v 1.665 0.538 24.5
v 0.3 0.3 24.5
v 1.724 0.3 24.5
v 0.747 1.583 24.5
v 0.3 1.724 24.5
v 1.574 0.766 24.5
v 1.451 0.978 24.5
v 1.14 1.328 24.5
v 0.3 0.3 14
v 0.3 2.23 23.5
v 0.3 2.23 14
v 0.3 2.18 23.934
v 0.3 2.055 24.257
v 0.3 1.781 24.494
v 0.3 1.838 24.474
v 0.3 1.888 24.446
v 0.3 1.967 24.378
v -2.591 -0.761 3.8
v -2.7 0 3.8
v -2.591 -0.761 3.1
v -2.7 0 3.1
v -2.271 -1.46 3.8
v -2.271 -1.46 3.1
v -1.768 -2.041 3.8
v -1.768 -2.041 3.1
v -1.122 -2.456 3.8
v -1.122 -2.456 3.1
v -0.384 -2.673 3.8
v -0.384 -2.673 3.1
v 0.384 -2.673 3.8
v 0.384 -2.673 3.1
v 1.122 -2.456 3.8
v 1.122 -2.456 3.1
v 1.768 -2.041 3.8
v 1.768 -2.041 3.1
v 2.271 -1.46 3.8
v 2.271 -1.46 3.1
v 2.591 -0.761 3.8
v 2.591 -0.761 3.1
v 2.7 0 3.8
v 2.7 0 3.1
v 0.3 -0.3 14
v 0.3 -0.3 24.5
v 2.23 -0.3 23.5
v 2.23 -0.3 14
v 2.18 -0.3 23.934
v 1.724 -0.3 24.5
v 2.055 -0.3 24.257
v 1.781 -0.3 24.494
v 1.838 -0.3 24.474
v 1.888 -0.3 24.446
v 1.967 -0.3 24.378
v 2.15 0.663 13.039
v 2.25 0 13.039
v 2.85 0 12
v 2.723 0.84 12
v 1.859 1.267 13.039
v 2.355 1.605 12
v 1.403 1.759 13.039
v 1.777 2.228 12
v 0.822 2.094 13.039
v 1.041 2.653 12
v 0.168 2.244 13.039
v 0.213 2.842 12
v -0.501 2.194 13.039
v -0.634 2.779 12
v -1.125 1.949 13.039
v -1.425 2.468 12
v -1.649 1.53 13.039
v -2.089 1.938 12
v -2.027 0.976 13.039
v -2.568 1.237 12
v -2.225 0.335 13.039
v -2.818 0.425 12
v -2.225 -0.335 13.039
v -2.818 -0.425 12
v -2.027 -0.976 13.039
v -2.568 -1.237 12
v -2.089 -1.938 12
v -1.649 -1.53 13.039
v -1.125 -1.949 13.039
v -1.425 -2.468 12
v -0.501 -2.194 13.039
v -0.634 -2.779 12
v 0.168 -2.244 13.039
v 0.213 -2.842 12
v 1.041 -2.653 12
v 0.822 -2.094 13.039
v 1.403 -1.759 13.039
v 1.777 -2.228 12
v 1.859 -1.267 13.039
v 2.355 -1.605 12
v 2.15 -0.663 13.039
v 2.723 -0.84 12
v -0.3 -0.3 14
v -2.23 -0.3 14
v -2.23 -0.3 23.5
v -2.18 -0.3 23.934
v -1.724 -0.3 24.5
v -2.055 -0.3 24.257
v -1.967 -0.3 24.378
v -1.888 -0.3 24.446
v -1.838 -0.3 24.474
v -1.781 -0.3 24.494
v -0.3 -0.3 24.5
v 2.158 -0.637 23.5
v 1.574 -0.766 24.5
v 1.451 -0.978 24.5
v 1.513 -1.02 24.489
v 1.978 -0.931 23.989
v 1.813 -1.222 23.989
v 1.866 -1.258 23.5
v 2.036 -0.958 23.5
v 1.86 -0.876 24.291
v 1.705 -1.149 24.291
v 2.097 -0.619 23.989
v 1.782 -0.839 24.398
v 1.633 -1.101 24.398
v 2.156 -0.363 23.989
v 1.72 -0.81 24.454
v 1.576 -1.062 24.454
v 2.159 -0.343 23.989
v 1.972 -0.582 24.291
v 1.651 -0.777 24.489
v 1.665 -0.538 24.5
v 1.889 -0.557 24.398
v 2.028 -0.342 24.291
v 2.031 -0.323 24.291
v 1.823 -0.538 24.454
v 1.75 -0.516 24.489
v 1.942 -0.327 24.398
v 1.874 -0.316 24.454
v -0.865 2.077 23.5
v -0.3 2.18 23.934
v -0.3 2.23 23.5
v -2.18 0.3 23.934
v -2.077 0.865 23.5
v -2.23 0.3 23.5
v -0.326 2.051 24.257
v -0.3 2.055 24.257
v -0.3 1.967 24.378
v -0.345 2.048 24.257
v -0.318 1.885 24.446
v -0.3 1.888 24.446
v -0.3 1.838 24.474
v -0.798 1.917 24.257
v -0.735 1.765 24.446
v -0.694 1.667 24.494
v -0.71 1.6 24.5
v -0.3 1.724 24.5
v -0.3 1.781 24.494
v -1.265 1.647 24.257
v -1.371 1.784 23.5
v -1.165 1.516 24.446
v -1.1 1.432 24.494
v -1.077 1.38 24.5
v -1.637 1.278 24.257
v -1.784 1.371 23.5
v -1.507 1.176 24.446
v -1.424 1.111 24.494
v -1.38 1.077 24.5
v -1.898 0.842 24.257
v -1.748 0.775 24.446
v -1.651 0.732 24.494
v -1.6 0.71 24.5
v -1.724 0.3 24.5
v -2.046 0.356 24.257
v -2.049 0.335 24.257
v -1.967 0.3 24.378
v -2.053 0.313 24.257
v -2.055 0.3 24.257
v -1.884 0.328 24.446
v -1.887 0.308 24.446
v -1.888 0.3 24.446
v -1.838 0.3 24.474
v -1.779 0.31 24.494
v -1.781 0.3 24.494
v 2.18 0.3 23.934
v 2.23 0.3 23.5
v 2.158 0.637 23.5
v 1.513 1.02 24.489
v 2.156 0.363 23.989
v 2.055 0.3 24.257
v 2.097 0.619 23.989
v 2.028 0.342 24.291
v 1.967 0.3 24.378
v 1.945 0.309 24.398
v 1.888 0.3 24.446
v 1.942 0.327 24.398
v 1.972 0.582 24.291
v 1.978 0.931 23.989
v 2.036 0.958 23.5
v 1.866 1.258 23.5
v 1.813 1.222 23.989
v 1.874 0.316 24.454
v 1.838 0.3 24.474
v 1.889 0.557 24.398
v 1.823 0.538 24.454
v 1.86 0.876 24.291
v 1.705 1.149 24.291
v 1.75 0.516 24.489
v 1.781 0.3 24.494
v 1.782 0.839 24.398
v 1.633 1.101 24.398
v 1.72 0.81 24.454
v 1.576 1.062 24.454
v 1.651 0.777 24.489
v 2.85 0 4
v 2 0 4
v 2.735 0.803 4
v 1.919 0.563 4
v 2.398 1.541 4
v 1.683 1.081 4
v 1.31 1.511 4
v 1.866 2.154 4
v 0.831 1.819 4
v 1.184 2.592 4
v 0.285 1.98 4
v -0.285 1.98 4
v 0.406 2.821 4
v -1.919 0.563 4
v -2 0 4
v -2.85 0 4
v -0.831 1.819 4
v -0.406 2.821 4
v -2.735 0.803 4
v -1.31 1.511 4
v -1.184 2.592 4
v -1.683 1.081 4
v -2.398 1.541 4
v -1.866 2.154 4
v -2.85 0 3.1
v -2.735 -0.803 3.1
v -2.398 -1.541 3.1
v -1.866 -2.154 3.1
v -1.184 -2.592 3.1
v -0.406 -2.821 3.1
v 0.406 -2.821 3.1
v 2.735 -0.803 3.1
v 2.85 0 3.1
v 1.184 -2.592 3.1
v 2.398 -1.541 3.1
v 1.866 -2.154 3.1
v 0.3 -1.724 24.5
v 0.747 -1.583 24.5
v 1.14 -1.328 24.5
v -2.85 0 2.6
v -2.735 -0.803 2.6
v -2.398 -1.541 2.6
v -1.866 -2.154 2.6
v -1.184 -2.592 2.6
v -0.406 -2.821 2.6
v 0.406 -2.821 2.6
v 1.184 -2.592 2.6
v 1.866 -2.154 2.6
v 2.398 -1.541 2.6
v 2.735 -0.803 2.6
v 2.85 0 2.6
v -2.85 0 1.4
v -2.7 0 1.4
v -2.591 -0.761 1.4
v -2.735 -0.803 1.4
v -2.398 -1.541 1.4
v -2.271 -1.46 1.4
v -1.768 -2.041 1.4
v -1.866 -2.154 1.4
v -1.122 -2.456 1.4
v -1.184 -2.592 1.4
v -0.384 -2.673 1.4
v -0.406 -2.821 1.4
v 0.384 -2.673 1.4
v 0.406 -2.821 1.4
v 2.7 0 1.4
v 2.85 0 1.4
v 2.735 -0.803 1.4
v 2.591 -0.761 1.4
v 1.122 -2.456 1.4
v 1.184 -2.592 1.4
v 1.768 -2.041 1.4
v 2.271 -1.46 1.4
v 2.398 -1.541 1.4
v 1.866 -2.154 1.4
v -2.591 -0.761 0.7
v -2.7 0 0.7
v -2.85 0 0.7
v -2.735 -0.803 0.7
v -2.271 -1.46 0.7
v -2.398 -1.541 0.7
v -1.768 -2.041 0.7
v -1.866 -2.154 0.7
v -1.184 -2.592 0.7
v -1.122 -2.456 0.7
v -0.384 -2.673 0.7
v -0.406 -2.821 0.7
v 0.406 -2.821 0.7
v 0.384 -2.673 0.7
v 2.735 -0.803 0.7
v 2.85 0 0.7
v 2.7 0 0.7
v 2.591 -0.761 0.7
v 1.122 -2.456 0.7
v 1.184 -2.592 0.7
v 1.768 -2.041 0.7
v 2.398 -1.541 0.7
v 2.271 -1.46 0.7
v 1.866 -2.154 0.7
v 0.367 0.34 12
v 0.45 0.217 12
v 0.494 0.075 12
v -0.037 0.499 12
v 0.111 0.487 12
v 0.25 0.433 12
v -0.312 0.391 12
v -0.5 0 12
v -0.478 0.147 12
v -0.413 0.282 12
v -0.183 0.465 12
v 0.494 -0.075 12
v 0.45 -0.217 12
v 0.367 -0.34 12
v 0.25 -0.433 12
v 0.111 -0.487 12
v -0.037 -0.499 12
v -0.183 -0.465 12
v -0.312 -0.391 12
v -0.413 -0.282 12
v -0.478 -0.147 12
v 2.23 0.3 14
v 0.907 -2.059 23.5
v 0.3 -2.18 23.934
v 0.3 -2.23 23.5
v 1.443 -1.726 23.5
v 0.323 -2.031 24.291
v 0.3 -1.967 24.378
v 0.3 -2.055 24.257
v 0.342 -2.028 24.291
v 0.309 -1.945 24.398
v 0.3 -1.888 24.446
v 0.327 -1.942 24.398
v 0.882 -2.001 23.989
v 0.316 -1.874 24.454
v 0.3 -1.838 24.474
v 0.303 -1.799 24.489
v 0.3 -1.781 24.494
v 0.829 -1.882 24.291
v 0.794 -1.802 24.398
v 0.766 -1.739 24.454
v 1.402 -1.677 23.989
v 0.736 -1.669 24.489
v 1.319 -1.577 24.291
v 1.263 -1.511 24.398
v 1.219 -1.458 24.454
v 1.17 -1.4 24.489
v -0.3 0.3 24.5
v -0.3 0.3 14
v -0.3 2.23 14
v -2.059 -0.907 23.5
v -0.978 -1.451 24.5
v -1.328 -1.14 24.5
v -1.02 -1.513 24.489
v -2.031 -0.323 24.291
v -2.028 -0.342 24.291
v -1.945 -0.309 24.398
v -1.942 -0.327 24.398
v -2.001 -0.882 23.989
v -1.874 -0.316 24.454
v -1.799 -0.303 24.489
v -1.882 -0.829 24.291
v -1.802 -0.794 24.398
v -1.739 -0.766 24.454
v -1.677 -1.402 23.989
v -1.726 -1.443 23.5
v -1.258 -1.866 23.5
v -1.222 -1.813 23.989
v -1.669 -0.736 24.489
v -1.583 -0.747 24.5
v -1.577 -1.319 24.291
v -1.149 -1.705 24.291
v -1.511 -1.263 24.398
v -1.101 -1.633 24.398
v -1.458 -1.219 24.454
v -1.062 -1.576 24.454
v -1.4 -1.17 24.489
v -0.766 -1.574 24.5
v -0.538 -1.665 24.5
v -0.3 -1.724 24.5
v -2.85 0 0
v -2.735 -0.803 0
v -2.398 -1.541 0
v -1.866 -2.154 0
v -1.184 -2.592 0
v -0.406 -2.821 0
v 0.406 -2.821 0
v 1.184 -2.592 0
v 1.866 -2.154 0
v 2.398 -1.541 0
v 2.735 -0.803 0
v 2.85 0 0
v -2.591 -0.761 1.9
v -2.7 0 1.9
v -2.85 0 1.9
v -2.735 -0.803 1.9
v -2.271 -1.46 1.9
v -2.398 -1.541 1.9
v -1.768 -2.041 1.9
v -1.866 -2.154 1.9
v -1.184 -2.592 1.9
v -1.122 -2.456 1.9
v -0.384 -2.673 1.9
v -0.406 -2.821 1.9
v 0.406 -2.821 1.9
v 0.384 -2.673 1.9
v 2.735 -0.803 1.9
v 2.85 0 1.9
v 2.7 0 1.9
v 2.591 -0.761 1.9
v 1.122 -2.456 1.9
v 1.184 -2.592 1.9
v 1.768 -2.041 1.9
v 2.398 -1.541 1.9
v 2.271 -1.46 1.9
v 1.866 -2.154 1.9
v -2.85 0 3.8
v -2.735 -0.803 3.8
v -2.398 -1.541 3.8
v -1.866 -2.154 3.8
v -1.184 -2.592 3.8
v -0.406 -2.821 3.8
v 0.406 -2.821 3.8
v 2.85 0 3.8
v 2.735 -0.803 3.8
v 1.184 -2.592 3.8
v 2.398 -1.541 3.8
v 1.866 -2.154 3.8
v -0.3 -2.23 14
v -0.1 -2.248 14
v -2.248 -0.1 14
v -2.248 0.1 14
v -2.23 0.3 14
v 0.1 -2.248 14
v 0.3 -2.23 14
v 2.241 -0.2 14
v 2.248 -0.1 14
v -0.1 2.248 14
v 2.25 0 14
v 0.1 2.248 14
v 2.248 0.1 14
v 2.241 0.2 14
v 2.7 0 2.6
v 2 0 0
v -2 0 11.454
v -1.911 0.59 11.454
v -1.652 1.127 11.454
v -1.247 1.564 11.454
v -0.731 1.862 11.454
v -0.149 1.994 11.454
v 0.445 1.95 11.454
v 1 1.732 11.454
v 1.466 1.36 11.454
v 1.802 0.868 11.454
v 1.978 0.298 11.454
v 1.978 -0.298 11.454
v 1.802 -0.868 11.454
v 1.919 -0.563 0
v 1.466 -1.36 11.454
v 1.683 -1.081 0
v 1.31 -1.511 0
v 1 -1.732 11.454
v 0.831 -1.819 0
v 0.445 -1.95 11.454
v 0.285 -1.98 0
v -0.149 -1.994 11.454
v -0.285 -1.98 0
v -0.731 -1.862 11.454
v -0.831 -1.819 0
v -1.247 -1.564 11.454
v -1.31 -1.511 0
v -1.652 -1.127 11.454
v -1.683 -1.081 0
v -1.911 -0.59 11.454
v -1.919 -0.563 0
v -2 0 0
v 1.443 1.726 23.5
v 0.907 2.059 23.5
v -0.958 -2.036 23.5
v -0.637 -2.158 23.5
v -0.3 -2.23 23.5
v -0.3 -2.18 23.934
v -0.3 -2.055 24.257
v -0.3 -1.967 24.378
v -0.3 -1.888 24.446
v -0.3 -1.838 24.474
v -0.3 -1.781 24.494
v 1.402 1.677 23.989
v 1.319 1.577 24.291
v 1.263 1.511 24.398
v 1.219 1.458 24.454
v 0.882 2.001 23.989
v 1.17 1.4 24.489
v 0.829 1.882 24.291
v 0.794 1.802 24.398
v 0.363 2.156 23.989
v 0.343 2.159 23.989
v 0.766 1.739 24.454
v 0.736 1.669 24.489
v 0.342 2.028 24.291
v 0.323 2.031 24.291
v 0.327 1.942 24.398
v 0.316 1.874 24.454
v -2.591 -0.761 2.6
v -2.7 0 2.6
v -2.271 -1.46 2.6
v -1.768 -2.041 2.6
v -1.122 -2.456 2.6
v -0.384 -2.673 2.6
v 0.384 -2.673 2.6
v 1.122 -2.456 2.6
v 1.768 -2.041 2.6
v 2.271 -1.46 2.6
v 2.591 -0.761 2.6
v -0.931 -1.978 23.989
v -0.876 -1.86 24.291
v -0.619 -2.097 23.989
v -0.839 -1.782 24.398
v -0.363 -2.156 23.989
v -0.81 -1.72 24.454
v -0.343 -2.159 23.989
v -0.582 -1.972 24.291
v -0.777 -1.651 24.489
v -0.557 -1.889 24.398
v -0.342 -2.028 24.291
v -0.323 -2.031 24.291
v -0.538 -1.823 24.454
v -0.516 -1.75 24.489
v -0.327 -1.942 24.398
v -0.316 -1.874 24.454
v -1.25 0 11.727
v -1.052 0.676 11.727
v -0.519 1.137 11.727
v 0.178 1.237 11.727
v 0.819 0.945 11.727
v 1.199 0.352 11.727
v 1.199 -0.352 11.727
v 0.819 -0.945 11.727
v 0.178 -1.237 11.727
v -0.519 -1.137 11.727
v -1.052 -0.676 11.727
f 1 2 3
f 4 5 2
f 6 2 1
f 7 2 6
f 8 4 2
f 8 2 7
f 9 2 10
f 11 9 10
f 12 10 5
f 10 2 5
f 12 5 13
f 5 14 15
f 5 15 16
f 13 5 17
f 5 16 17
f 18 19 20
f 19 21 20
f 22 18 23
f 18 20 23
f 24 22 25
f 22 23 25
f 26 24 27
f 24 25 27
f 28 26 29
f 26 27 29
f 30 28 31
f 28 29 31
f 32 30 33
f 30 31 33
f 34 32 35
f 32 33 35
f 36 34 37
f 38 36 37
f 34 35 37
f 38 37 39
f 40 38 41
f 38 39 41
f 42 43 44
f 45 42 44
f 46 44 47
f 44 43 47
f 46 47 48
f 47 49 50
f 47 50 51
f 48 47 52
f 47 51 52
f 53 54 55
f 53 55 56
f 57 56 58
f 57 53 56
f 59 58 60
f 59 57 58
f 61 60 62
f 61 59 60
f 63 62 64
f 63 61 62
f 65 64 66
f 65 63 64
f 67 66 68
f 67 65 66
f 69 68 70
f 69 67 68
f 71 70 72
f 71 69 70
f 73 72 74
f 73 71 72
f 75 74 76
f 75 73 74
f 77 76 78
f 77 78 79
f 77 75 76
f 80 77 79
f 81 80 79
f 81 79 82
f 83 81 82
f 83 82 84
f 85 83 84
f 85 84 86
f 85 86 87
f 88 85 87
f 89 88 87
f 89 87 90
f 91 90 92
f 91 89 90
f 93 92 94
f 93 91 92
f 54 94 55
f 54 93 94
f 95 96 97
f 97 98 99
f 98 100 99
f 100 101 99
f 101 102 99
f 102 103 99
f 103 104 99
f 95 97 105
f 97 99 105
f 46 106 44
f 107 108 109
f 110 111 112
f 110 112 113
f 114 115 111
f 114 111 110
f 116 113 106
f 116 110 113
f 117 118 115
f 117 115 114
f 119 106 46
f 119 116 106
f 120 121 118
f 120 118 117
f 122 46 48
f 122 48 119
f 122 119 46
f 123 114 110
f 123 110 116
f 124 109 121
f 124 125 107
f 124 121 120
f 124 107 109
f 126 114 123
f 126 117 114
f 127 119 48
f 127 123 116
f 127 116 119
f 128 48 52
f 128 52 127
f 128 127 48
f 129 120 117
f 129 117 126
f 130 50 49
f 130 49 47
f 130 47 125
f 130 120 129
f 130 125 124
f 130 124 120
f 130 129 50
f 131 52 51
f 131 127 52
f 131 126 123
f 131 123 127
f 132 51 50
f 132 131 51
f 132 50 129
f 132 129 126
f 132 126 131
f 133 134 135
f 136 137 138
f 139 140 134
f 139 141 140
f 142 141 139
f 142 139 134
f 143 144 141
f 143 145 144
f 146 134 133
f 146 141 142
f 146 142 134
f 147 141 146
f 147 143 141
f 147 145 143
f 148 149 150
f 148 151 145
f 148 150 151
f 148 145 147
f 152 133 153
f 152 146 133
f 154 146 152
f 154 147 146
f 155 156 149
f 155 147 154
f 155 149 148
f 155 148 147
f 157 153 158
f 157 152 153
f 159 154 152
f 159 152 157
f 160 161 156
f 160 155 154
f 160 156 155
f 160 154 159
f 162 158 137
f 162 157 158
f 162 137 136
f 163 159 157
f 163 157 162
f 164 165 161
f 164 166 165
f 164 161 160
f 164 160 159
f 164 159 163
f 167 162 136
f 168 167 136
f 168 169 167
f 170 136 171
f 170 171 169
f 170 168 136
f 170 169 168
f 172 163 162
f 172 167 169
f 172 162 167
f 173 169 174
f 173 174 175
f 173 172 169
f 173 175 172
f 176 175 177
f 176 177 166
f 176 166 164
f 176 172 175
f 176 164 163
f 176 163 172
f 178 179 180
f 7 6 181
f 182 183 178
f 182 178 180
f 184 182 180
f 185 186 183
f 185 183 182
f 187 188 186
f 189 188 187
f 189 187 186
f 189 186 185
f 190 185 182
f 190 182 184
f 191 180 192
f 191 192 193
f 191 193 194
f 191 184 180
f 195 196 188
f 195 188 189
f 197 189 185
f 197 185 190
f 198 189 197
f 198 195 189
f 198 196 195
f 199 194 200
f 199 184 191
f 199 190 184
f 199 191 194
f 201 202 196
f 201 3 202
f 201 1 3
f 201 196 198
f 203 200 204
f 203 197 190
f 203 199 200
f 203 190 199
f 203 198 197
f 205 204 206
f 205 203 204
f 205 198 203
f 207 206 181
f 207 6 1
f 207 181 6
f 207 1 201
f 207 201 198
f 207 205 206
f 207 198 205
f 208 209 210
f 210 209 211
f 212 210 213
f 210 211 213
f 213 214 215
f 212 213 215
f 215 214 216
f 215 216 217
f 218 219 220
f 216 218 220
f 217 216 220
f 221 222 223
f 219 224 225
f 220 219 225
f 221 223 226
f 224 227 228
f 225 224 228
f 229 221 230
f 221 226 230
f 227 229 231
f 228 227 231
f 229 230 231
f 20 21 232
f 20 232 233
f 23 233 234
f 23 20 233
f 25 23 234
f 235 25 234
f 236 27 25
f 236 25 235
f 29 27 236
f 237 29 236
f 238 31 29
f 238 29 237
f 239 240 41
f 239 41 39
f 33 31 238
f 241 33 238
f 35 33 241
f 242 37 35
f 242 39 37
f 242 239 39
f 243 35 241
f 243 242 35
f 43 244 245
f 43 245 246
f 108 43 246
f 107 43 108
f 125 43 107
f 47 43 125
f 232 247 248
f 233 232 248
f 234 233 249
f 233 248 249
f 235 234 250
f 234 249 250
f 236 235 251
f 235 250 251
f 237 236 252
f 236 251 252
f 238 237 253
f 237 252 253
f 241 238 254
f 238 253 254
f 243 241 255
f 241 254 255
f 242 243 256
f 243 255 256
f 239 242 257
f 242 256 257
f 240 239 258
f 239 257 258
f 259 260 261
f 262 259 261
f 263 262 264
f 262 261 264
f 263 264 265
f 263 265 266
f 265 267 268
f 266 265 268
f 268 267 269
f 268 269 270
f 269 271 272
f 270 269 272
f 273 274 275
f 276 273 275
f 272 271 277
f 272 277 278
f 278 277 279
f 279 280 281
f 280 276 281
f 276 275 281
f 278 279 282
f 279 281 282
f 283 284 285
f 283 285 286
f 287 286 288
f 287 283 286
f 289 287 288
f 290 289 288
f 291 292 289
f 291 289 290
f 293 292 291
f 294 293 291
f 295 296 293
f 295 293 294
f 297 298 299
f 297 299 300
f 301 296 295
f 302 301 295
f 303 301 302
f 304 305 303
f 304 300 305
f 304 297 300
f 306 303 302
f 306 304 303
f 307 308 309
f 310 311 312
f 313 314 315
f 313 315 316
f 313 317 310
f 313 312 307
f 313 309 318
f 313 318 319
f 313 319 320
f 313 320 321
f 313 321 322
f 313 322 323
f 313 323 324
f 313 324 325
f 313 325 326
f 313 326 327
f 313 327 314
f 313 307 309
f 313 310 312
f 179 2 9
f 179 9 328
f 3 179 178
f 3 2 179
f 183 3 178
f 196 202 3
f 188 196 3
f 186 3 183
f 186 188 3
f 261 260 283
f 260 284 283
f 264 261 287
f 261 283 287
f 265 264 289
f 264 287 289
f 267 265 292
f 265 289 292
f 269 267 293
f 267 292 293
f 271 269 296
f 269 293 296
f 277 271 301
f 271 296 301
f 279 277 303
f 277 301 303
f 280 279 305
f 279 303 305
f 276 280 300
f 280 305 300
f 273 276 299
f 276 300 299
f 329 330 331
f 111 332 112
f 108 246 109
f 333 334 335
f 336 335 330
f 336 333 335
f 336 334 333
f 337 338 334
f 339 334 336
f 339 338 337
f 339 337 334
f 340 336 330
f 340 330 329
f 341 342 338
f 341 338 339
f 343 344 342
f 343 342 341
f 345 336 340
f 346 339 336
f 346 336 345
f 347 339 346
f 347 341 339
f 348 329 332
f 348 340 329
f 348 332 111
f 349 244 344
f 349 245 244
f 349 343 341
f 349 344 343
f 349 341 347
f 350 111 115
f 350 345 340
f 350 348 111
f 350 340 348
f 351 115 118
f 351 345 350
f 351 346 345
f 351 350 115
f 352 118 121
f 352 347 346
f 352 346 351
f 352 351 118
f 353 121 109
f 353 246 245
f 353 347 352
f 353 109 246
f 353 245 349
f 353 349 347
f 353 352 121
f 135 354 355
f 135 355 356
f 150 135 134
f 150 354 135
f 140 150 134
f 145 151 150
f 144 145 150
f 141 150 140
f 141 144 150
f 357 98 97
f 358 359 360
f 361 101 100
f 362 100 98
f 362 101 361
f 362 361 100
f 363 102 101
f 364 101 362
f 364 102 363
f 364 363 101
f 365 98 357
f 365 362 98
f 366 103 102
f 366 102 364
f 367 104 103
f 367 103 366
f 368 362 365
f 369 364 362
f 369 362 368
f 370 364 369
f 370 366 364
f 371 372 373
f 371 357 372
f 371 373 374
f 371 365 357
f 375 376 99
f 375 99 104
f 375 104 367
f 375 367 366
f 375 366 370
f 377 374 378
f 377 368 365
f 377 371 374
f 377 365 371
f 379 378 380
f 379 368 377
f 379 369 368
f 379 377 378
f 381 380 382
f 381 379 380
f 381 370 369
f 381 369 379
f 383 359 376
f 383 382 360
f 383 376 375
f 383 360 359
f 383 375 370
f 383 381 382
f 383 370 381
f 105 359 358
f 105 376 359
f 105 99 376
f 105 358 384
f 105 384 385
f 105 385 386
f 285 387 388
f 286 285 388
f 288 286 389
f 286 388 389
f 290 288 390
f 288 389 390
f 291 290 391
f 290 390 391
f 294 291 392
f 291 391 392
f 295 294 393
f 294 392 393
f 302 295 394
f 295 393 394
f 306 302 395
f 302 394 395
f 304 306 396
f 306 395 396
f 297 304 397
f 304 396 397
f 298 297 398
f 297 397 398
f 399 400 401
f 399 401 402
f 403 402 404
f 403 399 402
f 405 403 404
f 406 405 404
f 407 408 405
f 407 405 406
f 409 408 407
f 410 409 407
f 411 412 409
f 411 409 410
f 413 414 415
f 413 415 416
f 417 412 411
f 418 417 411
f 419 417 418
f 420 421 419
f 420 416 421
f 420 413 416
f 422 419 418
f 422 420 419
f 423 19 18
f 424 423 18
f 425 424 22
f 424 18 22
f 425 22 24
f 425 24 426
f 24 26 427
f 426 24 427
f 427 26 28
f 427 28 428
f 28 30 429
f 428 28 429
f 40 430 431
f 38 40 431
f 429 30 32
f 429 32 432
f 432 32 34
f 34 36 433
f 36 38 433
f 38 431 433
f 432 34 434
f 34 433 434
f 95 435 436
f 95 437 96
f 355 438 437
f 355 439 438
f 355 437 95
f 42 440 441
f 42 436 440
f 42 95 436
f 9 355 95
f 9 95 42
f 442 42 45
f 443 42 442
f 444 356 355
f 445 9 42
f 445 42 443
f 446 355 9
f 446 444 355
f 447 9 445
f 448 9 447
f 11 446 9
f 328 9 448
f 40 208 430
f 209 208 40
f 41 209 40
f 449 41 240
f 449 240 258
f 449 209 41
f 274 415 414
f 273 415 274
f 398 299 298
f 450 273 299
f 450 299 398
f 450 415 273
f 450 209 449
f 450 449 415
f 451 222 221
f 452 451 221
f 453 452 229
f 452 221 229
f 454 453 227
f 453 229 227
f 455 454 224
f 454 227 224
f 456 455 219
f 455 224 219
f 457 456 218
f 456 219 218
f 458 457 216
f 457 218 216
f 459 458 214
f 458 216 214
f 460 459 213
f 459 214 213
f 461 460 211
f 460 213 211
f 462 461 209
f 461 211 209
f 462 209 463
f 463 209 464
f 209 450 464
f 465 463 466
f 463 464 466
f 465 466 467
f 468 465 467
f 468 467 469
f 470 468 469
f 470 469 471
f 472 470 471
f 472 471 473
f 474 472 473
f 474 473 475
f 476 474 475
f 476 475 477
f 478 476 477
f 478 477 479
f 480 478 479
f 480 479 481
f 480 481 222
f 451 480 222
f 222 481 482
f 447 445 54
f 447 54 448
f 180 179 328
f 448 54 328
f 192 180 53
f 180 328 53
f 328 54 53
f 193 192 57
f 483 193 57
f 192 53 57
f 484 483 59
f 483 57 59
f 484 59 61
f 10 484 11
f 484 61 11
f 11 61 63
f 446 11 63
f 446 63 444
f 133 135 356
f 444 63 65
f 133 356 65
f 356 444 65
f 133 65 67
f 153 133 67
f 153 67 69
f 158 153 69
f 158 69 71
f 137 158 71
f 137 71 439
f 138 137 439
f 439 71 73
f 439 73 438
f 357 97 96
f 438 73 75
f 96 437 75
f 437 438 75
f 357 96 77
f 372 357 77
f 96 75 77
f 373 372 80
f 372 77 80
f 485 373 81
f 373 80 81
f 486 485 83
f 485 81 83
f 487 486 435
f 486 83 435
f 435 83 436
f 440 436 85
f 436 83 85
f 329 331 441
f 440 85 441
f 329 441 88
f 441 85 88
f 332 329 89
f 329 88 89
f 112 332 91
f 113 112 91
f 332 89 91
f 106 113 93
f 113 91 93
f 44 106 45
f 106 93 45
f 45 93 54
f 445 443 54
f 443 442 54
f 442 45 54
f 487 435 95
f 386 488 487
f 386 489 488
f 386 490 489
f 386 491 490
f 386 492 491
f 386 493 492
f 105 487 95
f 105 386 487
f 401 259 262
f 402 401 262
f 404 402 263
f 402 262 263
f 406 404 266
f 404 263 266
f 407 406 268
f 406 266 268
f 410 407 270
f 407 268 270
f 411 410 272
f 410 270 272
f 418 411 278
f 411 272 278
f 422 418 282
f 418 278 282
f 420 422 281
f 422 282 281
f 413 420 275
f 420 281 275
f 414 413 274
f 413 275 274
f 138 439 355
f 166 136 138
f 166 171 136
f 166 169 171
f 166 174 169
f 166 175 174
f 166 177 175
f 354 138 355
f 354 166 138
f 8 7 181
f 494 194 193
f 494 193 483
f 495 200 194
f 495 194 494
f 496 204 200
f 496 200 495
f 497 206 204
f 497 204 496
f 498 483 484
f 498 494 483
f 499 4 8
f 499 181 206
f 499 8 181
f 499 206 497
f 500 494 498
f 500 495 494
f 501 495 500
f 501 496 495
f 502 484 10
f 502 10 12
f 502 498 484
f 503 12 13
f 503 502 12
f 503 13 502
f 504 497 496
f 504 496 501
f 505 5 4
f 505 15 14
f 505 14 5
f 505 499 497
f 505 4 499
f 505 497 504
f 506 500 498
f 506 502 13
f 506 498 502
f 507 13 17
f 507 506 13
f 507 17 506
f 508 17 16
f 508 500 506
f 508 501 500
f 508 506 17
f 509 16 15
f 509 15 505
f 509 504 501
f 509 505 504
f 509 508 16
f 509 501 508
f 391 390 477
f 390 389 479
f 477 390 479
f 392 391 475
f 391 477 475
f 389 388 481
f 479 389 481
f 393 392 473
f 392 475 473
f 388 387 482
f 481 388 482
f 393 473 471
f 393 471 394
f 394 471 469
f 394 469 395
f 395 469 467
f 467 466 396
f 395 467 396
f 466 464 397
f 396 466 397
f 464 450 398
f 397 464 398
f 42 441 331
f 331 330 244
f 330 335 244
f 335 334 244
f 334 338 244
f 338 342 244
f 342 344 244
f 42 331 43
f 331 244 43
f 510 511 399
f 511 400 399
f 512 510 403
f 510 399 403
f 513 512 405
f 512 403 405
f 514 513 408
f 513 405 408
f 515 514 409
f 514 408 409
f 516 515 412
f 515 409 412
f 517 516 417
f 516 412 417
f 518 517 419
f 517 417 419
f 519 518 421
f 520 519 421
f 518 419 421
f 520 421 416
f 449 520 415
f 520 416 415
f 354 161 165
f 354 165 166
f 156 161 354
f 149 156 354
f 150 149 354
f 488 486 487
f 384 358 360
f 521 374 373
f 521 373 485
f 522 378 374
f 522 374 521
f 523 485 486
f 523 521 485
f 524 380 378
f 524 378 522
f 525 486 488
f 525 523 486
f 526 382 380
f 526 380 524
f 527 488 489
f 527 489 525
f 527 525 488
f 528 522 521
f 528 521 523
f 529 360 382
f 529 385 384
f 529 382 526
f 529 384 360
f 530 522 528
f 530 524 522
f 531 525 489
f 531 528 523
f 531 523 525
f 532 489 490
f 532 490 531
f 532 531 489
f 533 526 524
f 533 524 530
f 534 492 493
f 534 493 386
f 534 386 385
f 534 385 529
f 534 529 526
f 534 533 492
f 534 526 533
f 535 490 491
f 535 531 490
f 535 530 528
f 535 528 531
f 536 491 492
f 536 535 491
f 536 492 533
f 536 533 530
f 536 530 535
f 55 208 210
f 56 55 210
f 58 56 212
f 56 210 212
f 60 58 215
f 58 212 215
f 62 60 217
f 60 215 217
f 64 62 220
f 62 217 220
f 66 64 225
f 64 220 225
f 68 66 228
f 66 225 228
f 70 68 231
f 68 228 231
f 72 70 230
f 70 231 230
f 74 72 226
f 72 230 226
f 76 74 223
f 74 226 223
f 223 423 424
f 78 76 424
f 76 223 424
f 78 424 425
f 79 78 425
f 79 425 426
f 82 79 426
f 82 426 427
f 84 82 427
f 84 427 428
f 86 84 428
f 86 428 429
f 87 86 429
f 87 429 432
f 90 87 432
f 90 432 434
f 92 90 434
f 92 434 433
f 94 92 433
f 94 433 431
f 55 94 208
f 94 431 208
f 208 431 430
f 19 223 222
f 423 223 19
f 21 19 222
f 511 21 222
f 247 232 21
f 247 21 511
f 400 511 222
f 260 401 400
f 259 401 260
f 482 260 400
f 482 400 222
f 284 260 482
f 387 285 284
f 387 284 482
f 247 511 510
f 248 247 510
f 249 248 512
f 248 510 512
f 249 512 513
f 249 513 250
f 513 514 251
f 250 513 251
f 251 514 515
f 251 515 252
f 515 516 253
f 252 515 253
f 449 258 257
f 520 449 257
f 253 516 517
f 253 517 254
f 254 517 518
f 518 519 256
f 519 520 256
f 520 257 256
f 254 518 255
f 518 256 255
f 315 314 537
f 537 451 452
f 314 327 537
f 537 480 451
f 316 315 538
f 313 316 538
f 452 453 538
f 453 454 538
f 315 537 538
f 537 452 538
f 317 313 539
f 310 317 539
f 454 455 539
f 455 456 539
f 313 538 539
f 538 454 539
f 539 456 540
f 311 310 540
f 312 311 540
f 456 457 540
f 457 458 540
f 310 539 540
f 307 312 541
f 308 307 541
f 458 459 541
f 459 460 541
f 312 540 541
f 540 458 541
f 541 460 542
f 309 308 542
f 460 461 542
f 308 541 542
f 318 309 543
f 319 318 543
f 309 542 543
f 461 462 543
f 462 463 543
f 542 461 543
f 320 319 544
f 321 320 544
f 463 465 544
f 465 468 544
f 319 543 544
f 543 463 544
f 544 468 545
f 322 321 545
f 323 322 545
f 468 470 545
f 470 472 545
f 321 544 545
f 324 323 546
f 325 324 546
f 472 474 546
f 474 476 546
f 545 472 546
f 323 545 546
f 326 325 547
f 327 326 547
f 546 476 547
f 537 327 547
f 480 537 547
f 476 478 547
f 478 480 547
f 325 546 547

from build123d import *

# Parameters (mm, degrees)
SKETCH_1_R               = 2.85
EXTRUDE_1_DEPTH          = 12
SKETCH_2_R               = 2.25
EXTRUDE_2_DEPTH          = 12.5
SKETCH_3_R               = 2
CUT_EXTRUDE_1_DEPTH      = 12
CHAMFER_1_SIZE           = 1.5
CHAMFER_1_SIZE2          = 0.545955351
CUT_EXTRUDE_2_DEPTH      = 25.829317349
CUT_EXTRUDE_2_DEPTH_BACK = 25.829317349
SKETCH_4_W               = 6.375471686
SKETCH_4_H               = 4.193701662
SKETCH_5_W               = 0.7
SKETCH_5_H               = 0.3
CHAMFER_2_SIZE           = 0.6
CHAMFER_2_SIZE_2         = 1.039230485
SKETCH_6_W               = 0.6
SKETCH_6_H               = 5
SKETCH_6_W_2             = 5
SKETCH_6_H_2             = 0.6
CUT_EXTRUDE_3_DEPTH      = 10.5
FILLET_1_SIZE            = 1
FILLET_1_SIZE_2          = 0.5


with BuildPart() as part:
    # Эскиз1 → Бобышка-Вытянуть1 (new body)
    with BuildSketch(Plane.XY):
        Circle(SKETCH_1_R)
    extrude(amount=EXTRUDE_1_DEPTH)

    # Эскиз2 → Бобышка-Вытянуть2 (add)
    with BuildSketch(Plane.XY.offset(12)):
        Circle(SKETCH_2_R)
    extrude(amount=EXTRUDE_2_DEPTH)

    # Эскиз3 → Вырез-Вытянуть1 (cut)
    with BuildSketch(Plane(origin=(0, 0, 0), x_dir=(-1, 0, 0), z_dir=(0, 0, -1))):
        Circle(SKETCH_3_R)
    extrude(amount=-CUT_EXTRUDE_1_DEPTH, mode=Mode.SUBTRACT)

    # Фаска1
    chamfer_1_edges = [part.edges().sort_by_distance(p)[0] for p in [
        (2, 0, 12),
    ]]
    chamfer_1_side = [part.faces().sort_by_distance(p)[0] for p in [
        (0, 0, 12),
    ]]
    chamfer(chamfer_1_edges, length=CHAMFER_1_SIZE, length2=CHAMFER_1_SIZE2, reference=chamfer_1_side[0])

    # Эскиз4 → Вырез-Вытянуть2 (cut, two sides: drawn at the far end of the back side and taken through both)
    with BuildSketch(Plane(origin=(0, 0, 0), x_dir=(0, 0, -1), z_dir=(1, 0, 0)).offset(-CUT_EXTRUDE_2_DEPTH_BACK)):
        with Locations((-0.812264157, 2.096850831)):
            Rectangle(SKETCH_4_W, SKETCH_4_H)
    extrude(amount=CUT_EXTRUDE_2_DEPTH + CUT_EXTRUDE_2_DEPTH_BACK, mode=Mode.SUBTRACT)

    # Эскиз5 → Вырез-Повернуть1 (revolve, cut)
    with BuildSketch(Plane(origin=(0, 0, 0), x_dir=(0, 0, -1), z_dir=(1, 0, 0))):
        with Locations((-3.45, -2.85)):
            Rectangle(SKETCH_5_W, SKETCH_5_H)
        with Locations((-2.25, -2.85)):
            Rectangle(SKETCH_5_W, SKETCH_5_H)
        with Locations((-1.05, -2.85)):
            Rectangle(SKETCH_5_W, SKETCH_5_H)
    revolve(axis=Axis((0, 0, 0), (0, 0, 1)), mode=Mode.SUBTRACT)

    # Фаска2
    # the kernel refuses this chamfer: 1.039230485, 0.6 mm, written as the material it adds along each edge
    with BuildSketch(Plane(origin=(0, 0, 12), x_dir=(1, 0, 0), z_dir=(0, -1, 0))) as chamfer_2_piece_1_section:
        Polygon((2.25 + CHAMFER_2_SIZE, 0), (2.25, CHAMFER_2_SIZE_2), (2.25, 0), align=None)
    chamfer_2_piece_1 = revolve(axis=Axis((0, 0, 12), (0, 0, 1)), mode=Mode.PRIVATE)
    chamfer_2_piece_1 = chamfer_2_piece_1 & Plane(origin=(0, 0, 12.528833644), x_dir=(1, 0, 0), z_dir=(0, 0, -1)) * Cylinder(2.85, 12, mode=Mode.PRIVATE)
    add(chamfer_2_piece_1)

    # Эскиз6 → Вырез-Вытянуть3 (cut)
    with BuildSketch(Plane.XY.offset(24.5)):
        Rectangle(SKETCH_6_W, SKETCH_6_H)
        Rectangle(SKETCH_6_W_2, SKETCH_6_H_2)
    extrude(amount=-CUT_EXTRUDE_3_DEPTH, mode=Mode.SUBTRACT)

    # Скругление1
    # an asymmetric fillet: 1, 0.5 mm, written as the material it takes off along each edge
    with BuildSketch(Plane(origin=(0, 0, 24.5), x_dir=(0.8292066330076089, 0.5589421792781295, 0), z_dir=(0.5589421792781295, -0.8292066330076089, 0))) as fillet_1_piece_1:
        with BuildLine():
            Bezier((2.25, -FILLET_1_SIZE), (2.25, 0), (2.25 - FILLET_1_SIZE_2, 0), weights=[1, 0.707106781, 1])
            Line((2.25 - FILLET_1_SIZE_2, 0), (2.25, 0))
            Line((2.25, 0), (2.25, -FILLET_1_SIZE))
        make_face()
    revolve(axis=Axis((0, 0, 24.5), (0, 0, 1)), revolution_arc=202.034652165, mode=Mode.SUBTRACT)
    with BuildSketch(Plane(origin=(0, 0, 24.5), x_dir=(-0.5589421792781271, 0.8292066330076105, 0), z_dir=(0.8292066330076105, 0.5589421792781271, 0))) as fillet_1_piece_2:
        with BuildLine():
            Bezier((2.25, -FILLET_1_SIZE), (2.25, 0), (2.25 - FILLET_1_SIZE_2, 0), weights=[1, 0.707106781, 1])
            Line((2.25 - FILLET_1_SIZE_2, 0), (2.25, 0))
            Line((2.25, 0), (2.25, -FILLET_1_SIZE))
        make_face()
    revolve(axis=Axis((0, 0, 24.5), (0, 0, 1)), revolution_arc=202.034652165, mode=Mode.SUBTRACT)
    with BuildSketch(Plane(origin=(0, 0, 24.5), x_dir=(-0.8292066330076107, -0.5589421792781271, 0), z_dir=(-0.5589421792781271, 0.8292066330076107, 0))) as fillet_1_piece_3:
        with BuildLine():
            Bezier((2.25, -FILLET_1_SIZE), (2.25, 0), (2.25 - FILLET_1_SIZE_2, 0), weights=[1, 0.707106781, 1])
            Line((2.25 - FILLET_1_SIZE_2, 0), (2.25, 0))
            Line((2.25, 0), (2.25, -FILLET_1_SIZE))
        make_face()
    revolve(axis=Axis((0, 0, 24.5), (0, 0, 1)), revolution_arc=202.034652165, mode=Mode.SUBTRACT)
    with BuildSketch(Plane(origin=(0, 0, 24.5), x_dir=(0.5589421792781443, -0.8292066330075989, 0), z_dir=(-0.8292066330075989, -0.5589421792781443, 0))) as fillet_1_piece_4:
        with BuildLine():
            Bezier((2.25, -FILLET_1_SIZE), (2.25, 0), (2.25 - FILLET_1_SIZE_2, 0), weights=[1, 0.707106781, 1])
            Line((2.25 - FILLET_1_SIZE_2, 0), (2.25, 0))
            Line((2.25, 0), (2.25, -FILLET_1_SIZE))
        make_face()
    revolve(axis=Axis((0, 0, 24.5), (0, 0, 1)), revolution_arc=202.034652165, mode=Mode.SUBTRACT)


solid = part.part
